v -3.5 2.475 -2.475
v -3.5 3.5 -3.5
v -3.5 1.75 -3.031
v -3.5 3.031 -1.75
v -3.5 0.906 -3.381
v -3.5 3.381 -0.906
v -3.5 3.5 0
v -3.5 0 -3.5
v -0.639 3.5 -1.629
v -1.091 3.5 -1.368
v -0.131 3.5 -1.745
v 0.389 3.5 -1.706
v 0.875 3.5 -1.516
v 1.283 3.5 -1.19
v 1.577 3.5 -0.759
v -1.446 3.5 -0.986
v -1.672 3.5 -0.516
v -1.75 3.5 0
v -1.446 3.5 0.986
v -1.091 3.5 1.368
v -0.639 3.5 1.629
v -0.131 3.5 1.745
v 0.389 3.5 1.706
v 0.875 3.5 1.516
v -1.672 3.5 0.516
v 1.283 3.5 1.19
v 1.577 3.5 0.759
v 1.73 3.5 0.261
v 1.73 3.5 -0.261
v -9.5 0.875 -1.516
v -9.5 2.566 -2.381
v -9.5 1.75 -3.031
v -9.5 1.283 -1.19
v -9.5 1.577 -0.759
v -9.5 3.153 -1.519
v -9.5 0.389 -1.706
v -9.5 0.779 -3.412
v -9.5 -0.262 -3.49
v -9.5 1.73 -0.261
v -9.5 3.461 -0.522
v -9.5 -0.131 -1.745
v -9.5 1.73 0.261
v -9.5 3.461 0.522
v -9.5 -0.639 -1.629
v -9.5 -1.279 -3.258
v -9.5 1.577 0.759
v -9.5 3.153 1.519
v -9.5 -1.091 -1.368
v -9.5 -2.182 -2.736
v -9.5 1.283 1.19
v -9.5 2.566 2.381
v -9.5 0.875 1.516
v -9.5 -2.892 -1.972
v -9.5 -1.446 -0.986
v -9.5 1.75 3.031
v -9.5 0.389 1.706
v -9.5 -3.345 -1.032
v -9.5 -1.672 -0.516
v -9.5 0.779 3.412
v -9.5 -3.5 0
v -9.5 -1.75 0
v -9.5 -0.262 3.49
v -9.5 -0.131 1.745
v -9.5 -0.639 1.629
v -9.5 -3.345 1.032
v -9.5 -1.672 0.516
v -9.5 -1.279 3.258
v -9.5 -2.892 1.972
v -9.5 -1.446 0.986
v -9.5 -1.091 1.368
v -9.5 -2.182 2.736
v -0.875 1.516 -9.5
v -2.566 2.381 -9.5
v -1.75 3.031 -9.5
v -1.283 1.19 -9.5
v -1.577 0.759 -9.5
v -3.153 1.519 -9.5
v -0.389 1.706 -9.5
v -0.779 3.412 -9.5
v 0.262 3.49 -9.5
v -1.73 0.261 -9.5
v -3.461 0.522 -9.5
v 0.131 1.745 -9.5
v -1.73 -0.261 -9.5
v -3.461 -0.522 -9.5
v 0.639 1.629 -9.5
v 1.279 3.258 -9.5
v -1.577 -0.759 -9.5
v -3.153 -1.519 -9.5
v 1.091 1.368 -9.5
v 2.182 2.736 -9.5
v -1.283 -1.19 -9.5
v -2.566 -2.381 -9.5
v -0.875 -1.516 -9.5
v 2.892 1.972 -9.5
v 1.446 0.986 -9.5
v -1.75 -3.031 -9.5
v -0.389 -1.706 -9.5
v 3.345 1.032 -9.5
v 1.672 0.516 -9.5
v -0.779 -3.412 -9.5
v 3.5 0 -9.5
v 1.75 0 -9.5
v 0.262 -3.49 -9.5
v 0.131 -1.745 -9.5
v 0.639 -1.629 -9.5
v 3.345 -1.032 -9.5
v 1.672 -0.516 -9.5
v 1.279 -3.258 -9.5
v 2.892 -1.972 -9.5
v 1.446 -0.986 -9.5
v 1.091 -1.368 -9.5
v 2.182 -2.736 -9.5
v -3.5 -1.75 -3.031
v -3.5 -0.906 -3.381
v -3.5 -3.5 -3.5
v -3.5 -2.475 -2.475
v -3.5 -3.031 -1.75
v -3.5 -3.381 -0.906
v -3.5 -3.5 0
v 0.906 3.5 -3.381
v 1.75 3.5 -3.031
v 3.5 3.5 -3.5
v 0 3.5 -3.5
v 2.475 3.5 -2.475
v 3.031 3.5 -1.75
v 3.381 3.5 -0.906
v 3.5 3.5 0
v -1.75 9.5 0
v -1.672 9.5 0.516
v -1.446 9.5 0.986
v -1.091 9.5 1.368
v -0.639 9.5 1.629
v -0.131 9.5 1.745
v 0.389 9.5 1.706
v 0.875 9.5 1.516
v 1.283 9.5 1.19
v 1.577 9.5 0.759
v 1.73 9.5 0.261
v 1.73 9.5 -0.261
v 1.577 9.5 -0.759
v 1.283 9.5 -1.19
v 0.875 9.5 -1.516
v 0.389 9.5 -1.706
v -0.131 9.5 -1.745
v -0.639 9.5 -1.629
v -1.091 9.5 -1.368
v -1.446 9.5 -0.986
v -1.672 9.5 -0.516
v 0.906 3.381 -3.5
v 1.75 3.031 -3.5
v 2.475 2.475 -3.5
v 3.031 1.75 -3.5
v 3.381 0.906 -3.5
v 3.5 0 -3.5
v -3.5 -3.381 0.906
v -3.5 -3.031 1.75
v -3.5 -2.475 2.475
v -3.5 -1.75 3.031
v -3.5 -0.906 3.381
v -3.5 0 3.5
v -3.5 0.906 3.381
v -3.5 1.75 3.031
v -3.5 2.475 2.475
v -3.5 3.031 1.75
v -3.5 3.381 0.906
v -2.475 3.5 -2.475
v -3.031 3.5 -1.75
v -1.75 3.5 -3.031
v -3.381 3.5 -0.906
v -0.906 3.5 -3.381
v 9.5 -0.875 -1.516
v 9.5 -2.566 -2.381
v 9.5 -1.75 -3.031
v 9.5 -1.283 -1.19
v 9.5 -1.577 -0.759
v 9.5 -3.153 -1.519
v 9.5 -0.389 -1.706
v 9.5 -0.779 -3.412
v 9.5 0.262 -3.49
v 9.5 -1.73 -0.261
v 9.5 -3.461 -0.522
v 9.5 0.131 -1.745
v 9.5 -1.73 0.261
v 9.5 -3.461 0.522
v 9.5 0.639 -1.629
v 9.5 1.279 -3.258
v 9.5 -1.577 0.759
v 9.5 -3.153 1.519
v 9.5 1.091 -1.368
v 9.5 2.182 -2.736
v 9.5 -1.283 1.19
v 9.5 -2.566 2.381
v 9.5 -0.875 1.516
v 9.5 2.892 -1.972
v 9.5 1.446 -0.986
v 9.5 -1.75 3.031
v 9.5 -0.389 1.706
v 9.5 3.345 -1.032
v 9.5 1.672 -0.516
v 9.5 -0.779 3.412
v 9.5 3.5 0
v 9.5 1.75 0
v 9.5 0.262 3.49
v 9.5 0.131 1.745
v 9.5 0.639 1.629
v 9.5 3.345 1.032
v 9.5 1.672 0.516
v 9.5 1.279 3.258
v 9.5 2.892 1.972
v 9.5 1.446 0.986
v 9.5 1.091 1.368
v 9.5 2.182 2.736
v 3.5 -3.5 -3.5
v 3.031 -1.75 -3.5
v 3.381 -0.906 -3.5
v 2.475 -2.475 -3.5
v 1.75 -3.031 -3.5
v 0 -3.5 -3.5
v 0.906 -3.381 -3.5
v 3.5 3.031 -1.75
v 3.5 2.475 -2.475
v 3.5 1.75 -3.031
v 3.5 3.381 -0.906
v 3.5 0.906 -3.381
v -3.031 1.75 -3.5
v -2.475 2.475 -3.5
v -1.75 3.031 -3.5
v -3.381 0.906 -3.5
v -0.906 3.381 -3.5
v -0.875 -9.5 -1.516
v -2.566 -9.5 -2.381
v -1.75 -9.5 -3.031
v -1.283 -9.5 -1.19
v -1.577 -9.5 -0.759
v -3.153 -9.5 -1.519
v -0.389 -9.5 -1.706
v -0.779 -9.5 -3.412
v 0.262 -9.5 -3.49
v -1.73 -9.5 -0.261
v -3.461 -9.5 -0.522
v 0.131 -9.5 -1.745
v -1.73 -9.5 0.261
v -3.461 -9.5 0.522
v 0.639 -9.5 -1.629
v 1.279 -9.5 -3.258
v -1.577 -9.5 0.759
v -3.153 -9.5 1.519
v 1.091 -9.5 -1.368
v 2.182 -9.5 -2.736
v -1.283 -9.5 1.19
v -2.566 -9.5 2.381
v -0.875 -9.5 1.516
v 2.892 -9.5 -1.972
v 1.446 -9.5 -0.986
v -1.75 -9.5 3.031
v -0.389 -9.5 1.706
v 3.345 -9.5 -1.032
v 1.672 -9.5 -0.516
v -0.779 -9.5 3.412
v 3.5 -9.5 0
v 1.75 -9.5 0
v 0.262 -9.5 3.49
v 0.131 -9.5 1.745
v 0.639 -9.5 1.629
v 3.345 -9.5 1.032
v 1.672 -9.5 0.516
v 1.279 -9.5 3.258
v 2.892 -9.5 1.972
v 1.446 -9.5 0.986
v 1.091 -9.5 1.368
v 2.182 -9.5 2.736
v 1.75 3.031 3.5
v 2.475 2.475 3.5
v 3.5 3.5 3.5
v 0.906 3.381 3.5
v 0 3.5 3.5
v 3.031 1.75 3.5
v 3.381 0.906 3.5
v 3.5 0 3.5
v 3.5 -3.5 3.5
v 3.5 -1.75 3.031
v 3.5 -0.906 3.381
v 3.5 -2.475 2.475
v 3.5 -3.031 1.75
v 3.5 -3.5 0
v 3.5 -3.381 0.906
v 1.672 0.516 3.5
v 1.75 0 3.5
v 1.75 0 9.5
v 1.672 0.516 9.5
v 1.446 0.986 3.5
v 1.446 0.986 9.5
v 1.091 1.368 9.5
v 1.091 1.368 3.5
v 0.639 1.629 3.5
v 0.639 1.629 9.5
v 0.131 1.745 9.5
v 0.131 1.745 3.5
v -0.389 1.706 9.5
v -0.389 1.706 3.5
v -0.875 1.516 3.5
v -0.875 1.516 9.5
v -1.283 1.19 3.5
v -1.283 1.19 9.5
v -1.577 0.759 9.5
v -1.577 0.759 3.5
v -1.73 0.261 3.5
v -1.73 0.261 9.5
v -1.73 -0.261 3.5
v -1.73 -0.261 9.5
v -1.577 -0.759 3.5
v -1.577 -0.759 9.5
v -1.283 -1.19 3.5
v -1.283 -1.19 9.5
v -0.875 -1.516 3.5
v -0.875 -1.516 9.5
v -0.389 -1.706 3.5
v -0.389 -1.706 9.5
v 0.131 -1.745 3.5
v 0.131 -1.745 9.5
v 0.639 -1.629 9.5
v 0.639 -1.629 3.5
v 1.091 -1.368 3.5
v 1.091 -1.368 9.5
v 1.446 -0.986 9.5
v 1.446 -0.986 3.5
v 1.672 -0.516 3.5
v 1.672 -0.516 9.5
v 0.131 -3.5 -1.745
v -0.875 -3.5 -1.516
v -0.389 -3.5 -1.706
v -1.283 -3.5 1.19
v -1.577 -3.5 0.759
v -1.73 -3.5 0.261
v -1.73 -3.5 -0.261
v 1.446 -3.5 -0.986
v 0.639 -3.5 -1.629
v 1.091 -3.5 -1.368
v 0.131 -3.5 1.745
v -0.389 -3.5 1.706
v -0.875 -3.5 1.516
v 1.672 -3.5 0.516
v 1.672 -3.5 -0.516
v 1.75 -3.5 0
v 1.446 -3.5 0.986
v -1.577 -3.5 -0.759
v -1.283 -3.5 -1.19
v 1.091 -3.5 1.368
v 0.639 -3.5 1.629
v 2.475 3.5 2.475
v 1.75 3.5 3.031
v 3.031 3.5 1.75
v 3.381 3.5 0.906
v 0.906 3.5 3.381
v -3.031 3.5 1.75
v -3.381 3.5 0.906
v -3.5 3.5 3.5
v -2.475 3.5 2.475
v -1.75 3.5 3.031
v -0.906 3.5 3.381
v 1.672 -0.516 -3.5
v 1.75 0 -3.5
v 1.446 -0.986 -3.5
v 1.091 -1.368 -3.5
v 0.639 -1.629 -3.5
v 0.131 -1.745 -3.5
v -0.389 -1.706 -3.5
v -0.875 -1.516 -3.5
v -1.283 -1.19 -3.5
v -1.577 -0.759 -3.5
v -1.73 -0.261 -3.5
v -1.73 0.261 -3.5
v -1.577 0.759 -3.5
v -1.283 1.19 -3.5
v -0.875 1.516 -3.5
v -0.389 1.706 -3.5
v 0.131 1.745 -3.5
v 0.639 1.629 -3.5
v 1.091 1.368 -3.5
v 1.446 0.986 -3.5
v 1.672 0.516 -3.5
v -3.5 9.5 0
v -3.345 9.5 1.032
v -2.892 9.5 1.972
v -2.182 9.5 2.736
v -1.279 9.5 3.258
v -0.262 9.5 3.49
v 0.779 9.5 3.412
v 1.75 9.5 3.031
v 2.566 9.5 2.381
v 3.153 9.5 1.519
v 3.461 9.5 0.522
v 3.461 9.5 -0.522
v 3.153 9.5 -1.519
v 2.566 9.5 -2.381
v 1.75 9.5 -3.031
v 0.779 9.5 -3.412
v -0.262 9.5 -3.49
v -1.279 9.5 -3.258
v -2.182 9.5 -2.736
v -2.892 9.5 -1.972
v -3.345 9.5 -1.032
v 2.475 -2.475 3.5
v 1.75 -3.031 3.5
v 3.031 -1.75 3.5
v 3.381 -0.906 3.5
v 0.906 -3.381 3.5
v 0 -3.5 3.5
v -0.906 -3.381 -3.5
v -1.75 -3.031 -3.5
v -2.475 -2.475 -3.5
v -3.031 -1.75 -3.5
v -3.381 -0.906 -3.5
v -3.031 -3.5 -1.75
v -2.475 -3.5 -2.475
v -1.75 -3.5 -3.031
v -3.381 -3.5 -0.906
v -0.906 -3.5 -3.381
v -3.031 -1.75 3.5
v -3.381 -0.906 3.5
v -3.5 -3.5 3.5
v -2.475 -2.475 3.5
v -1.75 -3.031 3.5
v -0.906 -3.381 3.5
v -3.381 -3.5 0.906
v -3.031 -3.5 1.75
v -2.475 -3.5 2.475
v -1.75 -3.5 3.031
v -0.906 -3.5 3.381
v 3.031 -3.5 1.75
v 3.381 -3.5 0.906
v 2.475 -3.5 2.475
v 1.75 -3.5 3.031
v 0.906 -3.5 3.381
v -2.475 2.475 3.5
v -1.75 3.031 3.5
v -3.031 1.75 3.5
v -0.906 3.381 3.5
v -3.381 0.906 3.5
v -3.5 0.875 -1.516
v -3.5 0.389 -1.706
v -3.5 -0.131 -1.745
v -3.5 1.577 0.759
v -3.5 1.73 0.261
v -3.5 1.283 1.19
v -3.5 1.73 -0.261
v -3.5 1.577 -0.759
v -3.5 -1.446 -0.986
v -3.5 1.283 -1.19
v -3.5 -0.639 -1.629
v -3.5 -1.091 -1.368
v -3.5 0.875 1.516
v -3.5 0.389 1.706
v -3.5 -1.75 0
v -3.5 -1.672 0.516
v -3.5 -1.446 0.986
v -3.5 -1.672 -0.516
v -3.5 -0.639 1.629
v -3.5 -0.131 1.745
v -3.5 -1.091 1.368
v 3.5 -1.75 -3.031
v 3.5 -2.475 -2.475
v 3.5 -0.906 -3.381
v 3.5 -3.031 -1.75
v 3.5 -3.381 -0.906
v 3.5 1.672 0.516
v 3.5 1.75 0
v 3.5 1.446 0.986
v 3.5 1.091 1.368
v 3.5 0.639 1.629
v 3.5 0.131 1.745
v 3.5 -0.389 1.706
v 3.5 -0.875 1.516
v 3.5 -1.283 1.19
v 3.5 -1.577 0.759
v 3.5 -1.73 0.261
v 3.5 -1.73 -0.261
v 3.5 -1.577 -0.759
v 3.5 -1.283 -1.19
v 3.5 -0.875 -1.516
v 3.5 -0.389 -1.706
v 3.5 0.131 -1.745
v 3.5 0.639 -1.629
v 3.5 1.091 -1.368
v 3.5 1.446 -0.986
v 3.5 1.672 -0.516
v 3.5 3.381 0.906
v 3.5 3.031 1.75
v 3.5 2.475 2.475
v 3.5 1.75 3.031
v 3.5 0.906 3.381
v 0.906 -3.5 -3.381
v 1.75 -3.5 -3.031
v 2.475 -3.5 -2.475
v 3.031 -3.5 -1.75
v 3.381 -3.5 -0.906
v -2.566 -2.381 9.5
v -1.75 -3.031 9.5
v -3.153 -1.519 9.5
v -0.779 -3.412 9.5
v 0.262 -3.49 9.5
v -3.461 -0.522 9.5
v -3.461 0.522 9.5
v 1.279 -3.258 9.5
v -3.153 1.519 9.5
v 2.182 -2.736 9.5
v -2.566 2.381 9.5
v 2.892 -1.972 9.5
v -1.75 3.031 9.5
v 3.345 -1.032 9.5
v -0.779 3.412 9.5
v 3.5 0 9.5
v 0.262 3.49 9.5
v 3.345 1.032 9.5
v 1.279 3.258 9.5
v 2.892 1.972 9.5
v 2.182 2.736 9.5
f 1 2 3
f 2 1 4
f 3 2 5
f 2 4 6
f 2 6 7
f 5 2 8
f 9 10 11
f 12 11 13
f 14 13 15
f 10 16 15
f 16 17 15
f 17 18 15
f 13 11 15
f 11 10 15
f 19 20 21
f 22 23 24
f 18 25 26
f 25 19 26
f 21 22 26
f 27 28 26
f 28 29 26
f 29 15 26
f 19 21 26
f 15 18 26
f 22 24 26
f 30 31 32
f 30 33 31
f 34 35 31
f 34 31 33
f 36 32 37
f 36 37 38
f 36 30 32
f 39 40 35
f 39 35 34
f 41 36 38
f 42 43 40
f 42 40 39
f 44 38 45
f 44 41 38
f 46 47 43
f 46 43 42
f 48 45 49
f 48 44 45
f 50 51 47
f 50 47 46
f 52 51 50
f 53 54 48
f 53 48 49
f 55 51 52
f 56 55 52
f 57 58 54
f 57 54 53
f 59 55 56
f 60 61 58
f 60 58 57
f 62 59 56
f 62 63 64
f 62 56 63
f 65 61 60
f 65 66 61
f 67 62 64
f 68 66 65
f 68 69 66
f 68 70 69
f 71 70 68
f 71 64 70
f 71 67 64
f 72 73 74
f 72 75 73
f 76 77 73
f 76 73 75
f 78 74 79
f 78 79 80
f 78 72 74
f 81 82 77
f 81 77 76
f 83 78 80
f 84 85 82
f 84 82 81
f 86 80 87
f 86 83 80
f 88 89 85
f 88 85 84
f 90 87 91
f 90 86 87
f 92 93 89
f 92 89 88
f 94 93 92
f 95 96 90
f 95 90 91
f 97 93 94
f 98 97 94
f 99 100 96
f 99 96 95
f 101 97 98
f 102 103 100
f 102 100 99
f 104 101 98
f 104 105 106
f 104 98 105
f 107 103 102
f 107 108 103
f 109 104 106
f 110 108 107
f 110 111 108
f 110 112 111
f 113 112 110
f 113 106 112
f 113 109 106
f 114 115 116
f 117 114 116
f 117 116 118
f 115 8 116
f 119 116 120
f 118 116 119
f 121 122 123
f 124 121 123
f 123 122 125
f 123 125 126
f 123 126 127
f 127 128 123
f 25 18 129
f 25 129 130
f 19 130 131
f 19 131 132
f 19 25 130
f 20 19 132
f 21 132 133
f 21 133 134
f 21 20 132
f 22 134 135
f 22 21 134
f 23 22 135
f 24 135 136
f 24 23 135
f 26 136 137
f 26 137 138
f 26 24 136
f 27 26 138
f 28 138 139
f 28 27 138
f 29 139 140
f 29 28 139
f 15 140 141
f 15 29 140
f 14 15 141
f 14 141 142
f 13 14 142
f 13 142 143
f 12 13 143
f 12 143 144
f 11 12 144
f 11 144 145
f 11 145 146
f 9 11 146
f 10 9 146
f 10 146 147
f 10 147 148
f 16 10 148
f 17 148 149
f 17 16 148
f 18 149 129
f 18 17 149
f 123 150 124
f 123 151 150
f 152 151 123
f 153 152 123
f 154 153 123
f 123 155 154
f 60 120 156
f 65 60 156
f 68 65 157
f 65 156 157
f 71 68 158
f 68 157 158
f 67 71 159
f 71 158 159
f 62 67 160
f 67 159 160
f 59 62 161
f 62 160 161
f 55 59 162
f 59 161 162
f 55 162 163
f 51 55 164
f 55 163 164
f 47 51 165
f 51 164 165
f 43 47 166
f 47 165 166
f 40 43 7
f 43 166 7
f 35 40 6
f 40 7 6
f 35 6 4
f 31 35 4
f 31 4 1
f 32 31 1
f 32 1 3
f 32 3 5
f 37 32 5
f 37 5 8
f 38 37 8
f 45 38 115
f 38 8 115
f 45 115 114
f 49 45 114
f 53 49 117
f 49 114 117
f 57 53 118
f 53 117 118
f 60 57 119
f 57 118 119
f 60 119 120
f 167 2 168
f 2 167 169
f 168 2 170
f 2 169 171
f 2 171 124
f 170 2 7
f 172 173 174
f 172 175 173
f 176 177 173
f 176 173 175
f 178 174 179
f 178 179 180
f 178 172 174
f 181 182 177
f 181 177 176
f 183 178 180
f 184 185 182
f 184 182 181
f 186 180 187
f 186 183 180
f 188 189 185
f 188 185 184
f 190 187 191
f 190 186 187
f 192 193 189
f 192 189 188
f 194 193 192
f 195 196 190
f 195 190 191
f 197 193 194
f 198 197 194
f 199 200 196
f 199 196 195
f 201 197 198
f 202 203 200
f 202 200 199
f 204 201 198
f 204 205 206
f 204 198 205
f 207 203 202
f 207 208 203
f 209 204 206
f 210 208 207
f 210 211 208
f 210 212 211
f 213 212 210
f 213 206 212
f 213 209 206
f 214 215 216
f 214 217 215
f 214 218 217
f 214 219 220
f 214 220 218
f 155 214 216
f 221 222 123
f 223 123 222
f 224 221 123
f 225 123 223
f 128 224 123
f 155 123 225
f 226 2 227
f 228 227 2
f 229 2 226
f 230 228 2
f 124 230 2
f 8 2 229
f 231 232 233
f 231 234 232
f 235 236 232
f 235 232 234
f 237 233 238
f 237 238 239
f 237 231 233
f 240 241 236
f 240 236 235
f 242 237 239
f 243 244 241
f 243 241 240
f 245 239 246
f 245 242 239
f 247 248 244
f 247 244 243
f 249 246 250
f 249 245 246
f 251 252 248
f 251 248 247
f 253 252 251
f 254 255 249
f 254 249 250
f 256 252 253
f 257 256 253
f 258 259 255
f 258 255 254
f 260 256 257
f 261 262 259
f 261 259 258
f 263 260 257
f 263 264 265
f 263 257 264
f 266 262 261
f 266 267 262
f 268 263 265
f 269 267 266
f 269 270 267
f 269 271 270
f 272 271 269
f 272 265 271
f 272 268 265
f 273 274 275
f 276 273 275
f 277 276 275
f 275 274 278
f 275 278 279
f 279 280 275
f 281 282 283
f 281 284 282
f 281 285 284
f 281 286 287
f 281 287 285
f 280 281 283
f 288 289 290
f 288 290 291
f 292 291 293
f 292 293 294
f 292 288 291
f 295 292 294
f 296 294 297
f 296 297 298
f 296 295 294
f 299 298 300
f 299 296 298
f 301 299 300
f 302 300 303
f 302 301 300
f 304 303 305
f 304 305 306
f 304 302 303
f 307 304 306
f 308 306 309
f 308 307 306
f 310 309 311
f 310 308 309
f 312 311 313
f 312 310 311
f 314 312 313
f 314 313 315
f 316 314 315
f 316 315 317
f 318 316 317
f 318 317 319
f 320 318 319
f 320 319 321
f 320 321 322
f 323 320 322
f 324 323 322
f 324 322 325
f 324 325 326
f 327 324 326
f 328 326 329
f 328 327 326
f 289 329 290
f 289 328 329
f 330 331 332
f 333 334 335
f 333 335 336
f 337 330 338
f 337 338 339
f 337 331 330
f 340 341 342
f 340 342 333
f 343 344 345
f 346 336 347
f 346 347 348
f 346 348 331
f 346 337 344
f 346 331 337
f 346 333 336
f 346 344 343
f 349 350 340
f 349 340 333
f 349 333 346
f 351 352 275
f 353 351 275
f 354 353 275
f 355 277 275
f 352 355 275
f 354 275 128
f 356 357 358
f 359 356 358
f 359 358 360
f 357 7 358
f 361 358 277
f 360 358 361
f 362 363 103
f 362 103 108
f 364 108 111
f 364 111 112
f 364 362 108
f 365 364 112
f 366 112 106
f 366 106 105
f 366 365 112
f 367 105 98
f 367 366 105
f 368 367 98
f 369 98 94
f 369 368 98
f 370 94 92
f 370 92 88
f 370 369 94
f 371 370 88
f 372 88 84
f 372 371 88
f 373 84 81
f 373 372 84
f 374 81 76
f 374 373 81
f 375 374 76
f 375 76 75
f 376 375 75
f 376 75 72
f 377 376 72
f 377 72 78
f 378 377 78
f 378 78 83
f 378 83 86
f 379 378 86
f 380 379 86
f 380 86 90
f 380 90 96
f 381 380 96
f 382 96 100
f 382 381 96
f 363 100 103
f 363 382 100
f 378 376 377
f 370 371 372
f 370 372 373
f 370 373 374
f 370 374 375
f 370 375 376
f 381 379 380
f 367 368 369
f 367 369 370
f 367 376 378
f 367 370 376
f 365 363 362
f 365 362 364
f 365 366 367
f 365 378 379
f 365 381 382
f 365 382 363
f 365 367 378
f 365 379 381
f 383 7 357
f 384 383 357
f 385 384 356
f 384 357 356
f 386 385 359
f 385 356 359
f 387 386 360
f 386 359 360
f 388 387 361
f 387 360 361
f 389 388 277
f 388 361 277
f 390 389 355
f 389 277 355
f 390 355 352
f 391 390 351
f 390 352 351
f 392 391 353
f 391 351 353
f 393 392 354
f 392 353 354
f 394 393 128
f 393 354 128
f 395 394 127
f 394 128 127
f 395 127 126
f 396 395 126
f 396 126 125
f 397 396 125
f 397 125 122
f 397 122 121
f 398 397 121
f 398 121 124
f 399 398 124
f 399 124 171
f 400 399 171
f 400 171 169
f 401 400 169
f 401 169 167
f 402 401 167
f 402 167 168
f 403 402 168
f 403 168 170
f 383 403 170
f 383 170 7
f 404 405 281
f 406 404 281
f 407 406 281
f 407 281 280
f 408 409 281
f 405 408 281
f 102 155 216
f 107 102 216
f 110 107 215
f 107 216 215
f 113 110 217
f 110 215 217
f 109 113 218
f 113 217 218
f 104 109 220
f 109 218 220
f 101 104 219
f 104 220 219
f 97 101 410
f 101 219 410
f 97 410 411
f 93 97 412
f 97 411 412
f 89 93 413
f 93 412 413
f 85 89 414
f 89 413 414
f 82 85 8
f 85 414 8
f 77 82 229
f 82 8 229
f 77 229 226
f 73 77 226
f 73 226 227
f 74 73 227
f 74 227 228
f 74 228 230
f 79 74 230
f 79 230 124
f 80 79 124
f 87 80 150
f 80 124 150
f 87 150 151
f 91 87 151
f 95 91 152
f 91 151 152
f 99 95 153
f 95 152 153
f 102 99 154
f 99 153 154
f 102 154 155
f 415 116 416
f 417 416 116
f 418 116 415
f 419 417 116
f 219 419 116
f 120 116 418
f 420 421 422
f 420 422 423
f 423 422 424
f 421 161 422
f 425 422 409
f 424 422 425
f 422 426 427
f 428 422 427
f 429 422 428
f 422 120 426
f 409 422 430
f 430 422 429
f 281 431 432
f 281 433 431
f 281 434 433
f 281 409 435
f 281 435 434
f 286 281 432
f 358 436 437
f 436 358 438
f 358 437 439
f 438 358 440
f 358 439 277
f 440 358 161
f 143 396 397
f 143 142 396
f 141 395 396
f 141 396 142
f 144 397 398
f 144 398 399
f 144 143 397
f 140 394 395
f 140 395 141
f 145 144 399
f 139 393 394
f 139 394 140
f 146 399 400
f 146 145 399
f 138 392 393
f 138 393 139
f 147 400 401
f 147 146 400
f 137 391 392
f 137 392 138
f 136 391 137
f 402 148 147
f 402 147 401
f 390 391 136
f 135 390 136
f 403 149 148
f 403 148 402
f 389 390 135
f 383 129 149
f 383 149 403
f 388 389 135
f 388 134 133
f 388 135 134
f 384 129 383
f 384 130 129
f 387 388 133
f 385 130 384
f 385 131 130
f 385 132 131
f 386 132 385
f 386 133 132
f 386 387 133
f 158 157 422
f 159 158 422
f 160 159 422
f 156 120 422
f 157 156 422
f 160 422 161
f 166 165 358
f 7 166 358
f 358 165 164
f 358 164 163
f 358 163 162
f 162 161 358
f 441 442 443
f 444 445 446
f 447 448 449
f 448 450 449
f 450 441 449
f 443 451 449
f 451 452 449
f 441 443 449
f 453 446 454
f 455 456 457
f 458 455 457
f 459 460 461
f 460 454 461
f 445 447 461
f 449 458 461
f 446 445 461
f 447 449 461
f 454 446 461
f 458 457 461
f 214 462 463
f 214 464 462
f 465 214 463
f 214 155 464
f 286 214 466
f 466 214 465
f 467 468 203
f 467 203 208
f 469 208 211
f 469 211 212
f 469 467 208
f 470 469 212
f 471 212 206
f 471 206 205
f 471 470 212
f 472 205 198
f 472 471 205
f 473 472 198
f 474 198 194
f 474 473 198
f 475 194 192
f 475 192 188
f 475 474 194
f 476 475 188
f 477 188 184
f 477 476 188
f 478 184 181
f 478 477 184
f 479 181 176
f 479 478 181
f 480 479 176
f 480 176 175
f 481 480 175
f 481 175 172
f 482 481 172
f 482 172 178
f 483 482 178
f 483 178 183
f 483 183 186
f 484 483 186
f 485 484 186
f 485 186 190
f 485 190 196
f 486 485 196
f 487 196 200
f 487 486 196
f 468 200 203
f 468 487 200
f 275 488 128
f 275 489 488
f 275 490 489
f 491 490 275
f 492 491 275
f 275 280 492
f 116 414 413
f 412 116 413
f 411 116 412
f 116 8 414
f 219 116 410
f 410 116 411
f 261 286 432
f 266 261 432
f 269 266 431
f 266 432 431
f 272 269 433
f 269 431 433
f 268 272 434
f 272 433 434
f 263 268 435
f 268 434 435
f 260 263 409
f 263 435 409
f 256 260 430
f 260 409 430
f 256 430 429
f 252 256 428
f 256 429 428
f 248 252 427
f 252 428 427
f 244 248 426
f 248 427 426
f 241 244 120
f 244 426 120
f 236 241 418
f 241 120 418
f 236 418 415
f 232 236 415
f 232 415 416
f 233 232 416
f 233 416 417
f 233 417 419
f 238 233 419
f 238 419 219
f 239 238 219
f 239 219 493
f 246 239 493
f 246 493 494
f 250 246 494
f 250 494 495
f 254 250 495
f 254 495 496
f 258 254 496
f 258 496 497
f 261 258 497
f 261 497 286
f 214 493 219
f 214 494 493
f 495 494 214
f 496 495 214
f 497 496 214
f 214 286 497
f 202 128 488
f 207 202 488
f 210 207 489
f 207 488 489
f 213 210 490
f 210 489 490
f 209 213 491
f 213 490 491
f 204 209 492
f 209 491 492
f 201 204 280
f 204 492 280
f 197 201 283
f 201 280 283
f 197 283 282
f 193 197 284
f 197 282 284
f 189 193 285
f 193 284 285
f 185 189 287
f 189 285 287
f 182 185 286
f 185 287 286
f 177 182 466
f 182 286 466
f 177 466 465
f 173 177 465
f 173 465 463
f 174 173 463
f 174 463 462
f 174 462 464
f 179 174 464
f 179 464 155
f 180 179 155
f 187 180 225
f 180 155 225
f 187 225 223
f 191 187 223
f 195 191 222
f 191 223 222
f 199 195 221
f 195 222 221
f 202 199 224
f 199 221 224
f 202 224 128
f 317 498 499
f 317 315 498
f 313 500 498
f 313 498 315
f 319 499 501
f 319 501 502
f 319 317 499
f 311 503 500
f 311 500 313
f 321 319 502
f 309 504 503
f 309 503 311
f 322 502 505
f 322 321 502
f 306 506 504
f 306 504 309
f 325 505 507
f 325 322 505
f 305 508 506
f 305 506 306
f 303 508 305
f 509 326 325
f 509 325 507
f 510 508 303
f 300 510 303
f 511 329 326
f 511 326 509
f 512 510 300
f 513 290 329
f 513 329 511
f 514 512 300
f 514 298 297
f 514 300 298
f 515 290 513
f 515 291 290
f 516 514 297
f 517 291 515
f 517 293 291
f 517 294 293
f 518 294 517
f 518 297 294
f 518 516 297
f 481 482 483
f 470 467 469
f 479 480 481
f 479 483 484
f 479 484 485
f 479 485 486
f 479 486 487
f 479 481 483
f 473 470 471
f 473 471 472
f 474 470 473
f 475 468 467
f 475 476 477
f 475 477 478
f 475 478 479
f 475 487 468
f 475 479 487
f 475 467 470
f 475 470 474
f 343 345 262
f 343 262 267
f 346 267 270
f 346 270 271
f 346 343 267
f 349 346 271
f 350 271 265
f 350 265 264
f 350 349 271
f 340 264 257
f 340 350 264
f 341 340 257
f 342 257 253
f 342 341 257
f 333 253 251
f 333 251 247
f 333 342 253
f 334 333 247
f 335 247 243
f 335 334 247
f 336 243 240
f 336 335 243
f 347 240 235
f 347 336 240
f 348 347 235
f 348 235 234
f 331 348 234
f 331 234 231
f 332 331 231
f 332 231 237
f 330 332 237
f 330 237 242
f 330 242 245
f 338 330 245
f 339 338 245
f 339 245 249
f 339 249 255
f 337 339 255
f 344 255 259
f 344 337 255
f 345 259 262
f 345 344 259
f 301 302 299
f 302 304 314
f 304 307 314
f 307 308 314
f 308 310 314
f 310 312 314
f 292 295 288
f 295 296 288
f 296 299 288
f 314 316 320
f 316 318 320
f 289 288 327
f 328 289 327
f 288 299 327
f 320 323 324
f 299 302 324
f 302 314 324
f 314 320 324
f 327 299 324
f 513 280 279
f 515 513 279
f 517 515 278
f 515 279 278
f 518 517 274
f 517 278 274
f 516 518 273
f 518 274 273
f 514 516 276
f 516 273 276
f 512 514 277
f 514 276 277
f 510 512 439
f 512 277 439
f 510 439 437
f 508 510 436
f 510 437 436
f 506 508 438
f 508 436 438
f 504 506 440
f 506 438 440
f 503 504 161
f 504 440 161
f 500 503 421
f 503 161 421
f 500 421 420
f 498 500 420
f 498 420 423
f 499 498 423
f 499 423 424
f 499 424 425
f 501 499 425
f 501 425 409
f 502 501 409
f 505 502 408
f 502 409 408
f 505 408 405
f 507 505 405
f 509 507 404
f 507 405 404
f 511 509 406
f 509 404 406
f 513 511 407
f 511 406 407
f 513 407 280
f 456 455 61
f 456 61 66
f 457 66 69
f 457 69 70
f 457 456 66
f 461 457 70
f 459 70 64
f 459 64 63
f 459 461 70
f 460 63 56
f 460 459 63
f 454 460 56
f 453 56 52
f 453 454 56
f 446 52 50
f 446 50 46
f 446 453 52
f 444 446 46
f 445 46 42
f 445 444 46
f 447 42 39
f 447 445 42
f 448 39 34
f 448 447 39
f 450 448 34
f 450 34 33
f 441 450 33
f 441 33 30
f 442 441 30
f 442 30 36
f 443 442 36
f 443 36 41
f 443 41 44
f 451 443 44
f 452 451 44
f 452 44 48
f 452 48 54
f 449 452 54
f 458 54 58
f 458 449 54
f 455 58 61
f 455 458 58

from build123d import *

# Parameters (mm, degrees)
F0_W      = 7
F0_H      = 7
F1_DEPTH  = 3.5
F2_R      = 3.5
F2_R_2    = 1.75
F3_DEPTH  = 6
F4_R      = 3.5
F4_R_2    = 1.75
F5_DEPTH  = 6
F6_R      = 3.5
F6_R_2    = 1.75
F7_DEPTH  = 6
F8_R      = 3.5
F8_R_2    = 1.75
F9_DEPTH  = 6
F10_R     = 3.5
F10_R_2   = 1.75
F11_DEPTH = 6
F12_R     = 3.5
F12_R_2   = 1.75
F13_DEPTH = 6


with BuildPart() as f1:
    # F0 (on Front) → F1 (new body, symmetric)
    with BuildSketch(Plane.XZ):
        Rectangle(F0_W, F0_H)
    extrude(amount=F1_DEPTH, both=True)

    # F2 (on face) → F3 (join)
    with BuildSketch(Plane.XZ.offset(3.5)):
        Circle(F2_R)
        Circle(F2_R_2, mode=Mode.SUBTRACT)
    extrude(amount=F3_DEPTH)

    # F4 (on face) → F5 (join)
    with BuildSketch(Plane(origin=(0, 0, -3.5), x_dir=(1, 0, 0), z_dir=(0, 0, -1))):
        Circle(F4_R)
        Circle(F4_R_2, mode=Mode.SUBTRACT)
    extrude(amount=F5_DEPTH)

    # F6 (on face) → F7 (join)
    with BuildSketch(Plane(origin=(0, 3.5, 0), x_dir=(-1, 0, 0), z_dir=(0, 1, 0))):
        Circle(F6_R)
        Circle(F6_R_2, mode=Mode.SUBTRACT)
    extrude(amount=F7_DEPTH)

    # F8 (on face) → F9 (join)
    with BuildSketch(Plane.XY.offset(3.5)):
        Circle(F8_R)
        Circle(F8_R_2, mode=Mode.SUBTRACT)
    extrude(amount=F9_DEPTH)

    # F10 (on face) → F11 (join)
    with BuildSketch(Plane(origin=(-3.5, 0, 0), x_dir=(0, -1, 0), z_dir=(-1, 0, 0))):
        Circle(F10_R)
        Circle(F10_R_2, mode=Mode.SUBTRACT)
    extrude(amount=F11_DEPTH)

    # F12 (on face) → F13 (join)
    with BuildSketch(Plane.YZ.offset(3.5)):
        Circle(F12_R)
        Circle(F12_R_2, mode=Mode.SUBTRACT)
    extrude(amount=F13_DEPTH)


solid = f1.part
